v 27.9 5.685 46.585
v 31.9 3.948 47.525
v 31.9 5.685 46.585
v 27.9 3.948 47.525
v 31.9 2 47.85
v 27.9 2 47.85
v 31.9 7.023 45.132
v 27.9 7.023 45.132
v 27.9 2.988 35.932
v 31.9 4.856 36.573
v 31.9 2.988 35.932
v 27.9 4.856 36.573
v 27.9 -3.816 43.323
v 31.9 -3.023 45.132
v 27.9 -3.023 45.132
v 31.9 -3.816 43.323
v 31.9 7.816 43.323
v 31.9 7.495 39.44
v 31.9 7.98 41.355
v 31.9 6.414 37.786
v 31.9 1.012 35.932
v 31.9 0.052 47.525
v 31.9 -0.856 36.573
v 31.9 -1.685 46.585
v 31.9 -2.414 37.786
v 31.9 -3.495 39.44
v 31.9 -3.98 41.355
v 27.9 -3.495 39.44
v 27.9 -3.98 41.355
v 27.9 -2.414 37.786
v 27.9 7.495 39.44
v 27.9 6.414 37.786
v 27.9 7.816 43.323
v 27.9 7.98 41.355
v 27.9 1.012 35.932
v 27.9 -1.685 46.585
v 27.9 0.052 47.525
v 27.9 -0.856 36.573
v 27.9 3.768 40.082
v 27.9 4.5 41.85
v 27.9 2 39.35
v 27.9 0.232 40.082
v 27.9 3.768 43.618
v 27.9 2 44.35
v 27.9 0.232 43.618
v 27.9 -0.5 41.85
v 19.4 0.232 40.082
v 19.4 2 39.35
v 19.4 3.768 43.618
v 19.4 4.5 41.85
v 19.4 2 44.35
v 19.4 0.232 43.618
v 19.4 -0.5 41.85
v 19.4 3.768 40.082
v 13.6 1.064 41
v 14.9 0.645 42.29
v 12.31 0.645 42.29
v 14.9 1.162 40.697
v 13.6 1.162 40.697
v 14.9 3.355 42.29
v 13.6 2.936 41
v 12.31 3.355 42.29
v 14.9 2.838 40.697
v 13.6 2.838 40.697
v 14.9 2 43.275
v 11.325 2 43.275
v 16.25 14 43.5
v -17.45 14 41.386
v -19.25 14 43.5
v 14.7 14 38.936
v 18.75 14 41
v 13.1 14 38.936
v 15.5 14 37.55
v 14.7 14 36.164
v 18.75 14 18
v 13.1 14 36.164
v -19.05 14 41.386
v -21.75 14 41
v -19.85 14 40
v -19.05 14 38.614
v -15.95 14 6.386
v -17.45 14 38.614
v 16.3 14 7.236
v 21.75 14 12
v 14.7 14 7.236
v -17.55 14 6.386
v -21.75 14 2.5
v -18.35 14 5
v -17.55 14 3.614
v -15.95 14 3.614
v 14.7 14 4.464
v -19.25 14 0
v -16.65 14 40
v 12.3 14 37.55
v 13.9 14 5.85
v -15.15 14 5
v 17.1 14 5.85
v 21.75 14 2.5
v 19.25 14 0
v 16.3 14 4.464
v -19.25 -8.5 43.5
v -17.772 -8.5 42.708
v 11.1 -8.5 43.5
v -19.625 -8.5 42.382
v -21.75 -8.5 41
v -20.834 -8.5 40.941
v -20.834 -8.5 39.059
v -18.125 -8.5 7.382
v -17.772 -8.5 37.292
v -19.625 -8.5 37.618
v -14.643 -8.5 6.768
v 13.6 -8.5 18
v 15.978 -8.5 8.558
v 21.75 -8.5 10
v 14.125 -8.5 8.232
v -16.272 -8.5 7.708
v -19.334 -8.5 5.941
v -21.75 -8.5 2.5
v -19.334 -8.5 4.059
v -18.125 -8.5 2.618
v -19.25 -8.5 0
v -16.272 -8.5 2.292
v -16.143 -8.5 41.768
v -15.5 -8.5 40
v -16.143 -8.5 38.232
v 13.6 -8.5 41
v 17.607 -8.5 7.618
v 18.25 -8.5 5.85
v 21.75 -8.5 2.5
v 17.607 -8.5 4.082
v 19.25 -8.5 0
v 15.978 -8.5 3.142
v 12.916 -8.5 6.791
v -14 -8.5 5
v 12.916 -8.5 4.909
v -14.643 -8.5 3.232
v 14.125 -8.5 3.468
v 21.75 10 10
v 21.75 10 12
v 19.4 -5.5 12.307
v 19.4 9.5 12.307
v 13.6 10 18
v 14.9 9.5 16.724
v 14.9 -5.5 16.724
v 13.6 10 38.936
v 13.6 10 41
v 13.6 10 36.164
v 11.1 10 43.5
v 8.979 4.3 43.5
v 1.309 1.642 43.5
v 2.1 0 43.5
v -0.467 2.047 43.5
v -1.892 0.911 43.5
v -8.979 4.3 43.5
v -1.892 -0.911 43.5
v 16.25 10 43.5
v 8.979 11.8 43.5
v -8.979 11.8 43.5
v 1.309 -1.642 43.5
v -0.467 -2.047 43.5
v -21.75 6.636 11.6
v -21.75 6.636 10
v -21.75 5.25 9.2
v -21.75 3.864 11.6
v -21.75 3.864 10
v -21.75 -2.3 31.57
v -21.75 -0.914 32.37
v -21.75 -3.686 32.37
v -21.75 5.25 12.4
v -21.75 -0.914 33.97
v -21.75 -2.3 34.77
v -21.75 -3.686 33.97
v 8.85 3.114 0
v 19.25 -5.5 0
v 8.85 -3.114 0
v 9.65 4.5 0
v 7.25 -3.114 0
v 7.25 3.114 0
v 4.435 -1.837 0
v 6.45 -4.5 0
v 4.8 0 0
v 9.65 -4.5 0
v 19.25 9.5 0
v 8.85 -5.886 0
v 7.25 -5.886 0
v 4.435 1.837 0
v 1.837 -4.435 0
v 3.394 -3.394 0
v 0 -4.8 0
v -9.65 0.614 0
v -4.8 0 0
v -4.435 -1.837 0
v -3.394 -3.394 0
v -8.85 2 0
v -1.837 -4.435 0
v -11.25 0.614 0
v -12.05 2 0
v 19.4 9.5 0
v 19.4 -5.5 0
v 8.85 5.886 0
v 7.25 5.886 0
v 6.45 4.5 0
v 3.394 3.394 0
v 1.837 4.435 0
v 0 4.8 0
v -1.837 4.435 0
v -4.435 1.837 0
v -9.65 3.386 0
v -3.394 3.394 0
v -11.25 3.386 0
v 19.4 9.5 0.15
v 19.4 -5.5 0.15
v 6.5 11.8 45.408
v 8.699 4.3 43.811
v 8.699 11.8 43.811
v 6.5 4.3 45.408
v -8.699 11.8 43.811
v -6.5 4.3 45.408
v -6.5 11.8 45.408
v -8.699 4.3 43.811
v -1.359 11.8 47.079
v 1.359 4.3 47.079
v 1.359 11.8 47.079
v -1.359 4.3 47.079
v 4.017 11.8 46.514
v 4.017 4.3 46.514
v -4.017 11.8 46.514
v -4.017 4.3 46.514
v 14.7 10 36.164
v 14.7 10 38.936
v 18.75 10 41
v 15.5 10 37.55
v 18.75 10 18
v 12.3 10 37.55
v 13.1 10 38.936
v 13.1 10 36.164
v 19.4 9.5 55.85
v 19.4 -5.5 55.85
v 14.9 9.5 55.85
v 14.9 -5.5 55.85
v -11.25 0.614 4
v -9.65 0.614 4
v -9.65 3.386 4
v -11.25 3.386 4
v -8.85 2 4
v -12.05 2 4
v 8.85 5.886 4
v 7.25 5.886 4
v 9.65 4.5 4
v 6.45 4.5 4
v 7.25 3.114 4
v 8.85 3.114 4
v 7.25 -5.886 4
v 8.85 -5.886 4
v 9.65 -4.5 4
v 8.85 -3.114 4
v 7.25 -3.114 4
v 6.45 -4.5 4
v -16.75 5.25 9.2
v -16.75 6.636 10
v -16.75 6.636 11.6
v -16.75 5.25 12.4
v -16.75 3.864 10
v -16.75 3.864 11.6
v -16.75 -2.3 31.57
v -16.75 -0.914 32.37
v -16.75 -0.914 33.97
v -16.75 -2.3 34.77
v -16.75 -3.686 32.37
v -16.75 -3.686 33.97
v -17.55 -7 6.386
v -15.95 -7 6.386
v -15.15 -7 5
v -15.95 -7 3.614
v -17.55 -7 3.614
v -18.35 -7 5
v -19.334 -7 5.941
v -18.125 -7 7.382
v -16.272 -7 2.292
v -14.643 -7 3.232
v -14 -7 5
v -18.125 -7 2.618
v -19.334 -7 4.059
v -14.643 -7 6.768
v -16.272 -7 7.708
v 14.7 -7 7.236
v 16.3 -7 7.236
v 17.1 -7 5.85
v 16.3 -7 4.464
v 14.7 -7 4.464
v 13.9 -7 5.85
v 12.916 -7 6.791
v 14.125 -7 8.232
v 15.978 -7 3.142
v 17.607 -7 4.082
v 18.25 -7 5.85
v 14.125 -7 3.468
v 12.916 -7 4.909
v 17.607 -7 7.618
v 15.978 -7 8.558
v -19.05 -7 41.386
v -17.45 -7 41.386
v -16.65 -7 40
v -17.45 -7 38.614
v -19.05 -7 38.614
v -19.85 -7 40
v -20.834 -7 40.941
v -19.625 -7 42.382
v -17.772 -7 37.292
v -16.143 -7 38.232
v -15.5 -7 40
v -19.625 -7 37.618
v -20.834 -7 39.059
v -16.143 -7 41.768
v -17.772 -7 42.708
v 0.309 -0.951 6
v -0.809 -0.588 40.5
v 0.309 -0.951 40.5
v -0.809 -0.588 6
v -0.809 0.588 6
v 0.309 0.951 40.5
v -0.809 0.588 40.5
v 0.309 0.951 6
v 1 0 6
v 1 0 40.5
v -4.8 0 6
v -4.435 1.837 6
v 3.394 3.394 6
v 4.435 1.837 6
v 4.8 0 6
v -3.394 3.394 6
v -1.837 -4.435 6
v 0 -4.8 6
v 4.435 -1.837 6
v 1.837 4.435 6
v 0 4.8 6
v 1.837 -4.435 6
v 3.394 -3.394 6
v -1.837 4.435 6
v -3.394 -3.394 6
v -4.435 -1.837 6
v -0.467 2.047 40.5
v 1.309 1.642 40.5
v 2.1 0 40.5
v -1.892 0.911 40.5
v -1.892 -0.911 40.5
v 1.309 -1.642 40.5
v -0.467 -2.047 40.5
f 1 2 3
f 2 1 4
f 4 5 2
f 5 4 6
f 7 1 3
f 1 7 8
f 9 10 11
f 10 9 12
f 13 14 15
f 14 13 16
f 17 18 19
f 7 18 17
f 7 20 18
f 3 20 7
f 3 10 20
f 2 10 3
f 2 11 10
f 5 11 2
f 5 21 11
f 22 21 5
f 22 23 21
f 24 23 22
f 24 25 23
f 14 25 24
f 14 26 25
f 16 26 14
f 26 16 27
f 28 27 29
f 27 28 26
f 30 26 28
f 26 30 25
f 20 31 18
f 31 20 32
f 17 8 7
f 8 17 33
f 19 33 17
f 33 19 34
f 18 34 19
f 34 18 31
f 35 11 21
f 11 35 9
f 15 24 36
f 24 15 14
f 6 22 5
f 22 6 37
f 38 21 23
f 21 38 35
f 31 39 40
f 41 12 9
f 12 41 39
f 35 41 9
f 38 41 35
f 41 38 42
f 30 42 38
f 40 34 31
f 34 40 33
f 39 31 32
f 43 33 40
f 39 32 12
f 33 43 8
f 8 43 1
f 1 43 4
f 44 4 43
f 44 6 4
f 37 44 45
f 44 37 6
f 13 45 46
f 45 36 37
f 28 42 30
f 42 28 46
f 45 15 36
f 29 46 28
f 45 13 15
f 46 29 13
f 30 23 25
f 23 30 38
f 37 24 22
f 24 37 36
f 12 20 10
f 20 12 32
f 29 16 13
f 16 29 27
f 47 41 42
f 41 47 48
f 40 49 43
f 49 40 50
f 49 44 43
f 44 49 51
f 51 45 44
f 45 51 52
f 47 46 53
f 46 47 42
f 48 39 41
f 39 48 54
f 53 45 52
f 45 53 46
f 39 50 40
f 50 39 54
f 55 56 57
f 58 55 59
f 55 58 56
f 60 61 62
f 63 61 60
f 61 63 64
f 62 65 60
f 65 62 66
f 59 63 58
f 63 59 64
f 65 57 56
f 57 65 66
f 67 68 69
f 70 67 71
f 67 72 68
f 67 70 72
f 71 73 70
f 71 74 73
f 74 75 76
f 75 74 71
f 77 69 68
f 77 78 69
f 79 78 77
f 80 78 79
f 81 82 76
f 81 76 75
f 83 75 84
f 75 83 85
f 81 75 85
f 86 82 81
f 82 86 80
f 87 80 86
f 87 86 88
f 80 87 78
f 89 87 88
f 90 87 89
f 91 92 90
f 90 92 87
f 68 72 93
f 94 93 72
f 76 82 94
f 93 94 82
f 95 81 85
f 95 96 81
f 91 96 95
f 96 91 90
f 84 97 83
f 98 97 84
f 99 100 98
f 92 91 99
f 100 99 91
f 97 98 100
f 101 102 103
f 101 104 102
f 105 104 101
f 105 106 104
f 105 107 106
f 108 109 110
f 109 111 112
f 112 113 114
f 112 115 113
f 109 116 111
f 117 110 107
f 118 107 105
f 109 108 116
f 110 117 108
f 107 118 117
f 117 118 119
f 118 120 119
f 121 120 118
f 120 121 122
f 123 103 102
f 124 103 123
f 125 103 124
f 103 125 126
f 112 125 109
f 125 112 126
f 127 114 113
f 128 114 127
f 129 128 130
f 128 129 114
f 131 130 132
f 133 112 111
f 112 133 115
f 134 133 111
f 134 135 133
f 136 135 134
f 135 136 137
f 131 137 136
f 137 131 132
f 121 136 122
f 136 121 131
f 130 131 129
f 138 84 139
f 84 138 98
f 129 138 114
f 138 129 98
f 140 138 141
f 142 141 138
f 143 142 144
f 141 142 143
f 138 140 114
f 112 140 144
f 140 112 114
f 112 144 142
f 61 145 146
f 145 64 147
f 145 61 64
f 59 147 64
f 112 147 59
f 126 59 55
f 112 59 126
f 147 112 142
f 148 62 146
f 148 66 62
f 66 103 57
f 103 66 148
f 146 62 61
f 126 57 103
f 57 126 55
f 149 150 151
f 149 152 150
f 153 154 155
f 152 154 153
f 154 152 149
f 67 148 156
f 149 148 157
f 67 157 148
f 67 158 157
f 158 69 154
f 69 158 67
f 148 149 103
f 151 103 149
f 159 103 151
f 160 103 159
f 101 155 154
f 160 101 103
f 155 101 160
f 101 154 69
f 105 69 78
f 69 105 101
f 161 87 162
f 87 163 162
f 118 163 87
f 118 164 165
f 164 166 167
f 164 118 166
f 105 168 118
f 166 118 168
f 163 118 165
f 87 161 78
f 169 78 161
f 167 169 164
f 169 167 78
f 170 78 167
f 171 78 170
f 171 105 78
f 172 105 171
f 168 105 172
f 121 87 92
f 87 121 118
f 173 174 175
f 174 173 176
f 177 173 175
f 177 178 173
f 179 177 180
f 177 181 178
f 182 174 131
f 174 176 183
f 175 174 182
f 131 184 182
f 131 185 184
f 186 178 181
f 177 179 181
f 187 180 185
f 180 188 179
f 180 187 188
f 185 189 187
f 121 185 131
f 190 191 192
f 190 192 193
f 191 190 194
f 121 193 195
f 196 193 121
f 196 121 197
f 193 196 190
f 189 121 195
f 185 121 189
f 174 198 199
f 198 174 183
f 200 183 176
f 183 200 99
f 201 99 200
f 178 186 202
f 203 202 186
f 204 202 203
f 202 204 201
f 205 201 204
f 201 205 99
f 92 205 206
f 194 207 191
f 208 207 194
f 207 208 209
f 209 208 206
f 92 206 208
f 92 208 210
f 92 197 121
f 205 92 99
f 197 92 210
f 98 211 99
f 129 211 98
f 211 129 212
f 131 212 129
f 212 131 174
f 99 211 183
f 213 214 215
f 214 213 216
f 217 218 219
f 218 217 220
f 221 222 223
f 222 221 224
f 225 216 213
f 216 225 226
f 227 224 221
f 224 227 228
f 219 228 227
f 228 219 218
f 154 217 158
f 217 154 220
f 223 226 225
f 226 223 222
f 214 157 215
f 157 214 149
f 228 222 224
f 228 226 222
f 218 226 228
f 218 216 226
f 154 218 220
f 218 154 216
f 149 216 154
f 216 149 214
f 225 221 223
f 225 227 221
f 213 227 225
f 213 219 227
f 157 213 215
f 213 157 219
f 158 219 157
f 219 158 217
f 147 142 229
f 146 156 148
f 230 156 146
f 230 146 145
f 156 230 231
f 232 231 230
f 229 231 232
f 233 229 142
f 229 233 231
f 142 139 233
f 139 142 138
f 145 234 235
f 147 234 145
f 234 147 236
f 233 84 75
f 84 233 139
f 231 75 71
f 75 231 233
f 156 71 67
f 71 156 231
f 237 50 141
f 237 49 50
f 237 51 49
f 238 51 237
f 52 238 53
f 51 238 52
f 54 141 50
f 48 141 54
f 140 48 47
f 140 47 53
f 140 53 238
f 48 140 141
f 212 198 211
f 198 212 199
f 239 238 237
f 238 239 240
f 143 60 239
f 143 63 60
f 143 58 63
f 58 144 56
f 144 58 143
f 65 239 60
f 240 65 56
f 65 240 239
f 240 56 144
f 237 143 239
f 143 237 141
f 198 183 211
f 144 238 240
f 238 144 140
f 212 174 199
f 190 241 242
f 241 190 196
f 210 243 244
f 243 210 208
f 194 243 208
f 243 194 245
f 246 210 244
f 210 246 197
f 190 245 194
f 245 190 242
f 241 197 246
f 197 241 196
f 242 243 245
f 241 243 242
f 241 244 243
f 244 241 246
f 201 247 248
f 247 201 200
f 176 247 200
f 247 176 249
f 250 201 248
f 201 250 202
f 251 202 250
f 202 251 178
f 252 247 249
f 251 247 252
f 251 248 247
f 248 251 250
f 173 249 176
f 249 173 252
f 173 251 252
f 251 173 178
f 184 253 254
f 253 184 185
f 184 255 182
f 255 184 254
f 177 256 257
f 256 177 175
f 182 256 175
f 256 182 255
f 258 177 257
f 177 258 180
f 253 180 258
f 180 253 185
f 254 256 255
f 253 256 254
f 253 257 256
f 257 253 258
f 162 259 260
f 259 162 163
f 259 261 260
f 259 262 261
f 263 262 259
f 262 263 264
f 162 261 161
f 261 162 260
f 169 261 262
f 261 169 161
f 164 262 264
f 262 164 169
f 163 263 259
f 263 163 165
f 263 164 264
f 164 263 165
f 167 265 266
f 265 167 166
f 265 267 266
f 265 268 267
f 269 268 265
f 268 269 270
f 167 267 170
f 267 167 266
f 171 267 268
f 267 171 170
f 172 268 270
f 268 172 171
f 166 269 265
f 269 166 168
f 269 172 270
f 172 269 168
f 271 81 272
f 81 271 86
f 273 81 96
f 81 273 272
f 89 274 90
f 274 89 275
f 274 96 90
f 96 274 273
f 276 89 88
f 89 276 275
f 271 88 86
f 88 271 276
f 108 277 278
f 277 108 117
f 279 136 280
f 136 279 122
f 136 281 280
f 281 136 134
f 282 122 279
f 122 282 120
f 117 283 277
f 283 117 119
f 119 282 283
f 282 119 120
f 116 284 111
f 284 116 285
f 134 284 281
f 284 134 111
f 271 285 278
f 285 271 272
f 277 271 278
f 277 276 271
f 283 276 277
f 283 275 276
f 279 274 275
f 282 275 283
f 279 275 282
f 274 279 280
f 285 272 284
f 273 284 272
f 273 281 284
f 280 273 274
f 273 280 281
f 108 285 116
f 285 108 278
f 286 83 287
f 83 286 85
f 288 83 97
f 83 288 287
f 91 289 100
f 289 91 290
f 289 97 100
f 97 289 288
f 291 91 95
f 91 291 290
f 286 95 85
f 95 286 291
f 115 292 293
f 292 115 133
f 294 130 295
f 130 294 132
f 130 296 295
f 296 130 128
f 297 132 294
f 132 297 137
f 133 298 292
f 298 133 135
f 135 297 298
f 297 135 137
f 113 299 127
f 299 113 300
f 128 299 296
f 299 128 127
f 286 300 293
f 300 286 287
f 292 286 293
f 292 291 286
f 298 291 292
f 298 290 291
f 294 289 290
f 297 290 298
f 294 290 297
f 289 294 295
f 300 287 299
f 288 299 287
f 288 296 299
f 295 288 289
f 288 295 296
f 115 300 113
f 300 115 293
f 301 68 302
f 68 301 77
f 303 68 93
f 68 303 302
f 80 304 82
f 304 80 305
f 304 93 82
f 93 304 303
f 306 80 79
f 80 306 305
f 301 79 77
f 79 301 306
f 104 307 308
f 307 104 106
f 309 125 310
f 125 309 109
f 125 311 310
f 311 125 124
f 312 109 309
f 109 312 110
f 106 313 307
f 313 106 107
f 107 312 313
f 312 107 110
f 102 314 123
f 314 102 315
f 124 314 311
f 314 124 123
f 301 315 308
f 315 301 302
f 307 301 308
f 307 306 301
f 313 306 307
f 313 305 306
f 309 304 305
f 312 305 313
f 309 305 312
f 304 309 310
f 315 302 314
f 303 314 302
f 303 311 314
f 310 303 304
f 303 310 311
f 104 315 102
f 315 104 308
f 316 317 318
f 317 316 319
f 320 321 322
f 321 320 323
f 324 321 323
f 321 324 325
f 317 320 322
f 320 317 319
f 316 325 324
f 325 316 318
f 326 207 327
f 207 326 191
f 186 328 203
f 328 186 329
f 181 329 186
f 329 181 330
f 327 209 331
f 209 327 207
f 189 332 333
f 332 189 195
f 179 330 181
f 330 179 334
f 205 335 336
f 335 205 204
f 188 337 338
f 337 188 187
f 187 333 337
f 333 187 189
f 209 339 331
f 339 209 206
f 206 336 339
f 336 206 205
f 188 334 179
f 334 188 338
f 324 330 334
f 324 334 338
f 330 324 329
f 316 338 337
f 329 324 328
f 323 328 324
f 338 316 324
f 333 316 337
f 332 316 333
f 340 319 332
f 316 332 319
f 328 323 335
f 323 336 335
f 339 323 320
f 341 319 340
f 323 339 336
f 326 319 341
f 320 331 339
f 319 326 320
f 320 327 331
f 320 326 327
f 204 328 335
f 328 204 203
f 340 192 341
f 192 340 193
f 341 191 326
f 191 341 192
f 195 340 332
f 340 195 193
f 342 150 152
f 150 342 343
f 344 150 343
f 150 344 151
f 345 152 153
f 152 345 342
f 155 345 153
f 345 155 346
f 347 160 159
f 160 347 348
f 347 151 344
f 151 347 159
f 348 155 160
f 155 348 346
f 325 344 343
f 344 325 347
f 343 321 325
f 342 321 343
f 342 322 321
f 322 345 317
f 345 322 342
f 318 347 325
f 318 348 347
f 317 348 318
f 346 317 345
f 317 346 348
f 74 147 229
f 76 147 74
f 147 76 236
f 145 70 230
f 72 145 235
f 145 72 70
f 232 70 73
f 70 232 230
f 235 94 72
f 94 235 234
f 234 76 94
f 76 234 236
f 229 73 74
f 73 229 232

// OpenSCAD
/*
  TBG-Lite extruder OpenSCAD library
  
  Based on datasheet and measures of TBG-Lite_mockup.STEP
  (C) 2022 Marek Wodzinski <majek@w7i.pl>
  
  This library is licensed under a Creative Commons Attribution-ShareAlike 4.0 International License.
  You should have received a copy of the license along with this work.
  If not, see <http://creativecommons.org/licenses/by-sa/4.0/
  
  Some basic dimensions:
  - holes for screws: 3.2mm, head 5.5mm
  - corners: 2.5mm from edge
  - distance from front to motor plate: 21mm
  - motor center: [19.9,21.1]
  - base dimensions: 43.50mm x 22.5mm
  - filement hole from front: 8.5mm
  - back plate thickness: 4mm
*/

function TBG_w() = 43.50;
function TBG_dimensions() = [ -TBG_w()/2, // left from center
                              TBG_w()/2, // right from center
                              -8.5, // front
                              14.0 ]; // back
function TBG_holes_bottom() = [[-10.45,2,0], [8.05,4.50,0], [8.05,-4.50,0]];
function TBG_holes_left() = [[-TBG_w()/2,5.25,TBG_w()/2-10.95], [-TBG_w()/2,-2.30,TBG_w()/2+11.42]];
function TBG_holes_front() = [[-TBG_w()/2+5.00,-8.50,5.00], [15.50,-8.50,5.85], [-TBG_w()/2+3.50,-8.50,TBG_w()-3.50]];
function TBG_body() = [[-TBG_w()/2+2.5,0], [TBG_w()/2-2.5,0], [TBG_w()/2,2.5], [TBG_w()/2,10], [TBG_w()/2-8.15,18], [TBG_w()/2-8.15,TBG_w()-2.5], [TBG_w()/2-8.15-2.5,TBG_w()], [-TBG_w()/2+2.5,TBG_w()], [-TBG_w()/2,TBG_w()-2.5], [-TBG_w()/2,2.5]];
function TBG_backplate() = [[-TBG_w()/2+2.5,0], [TBG_w()/2-2.5,0], [TBG_w()/2,2.5], [TBG_w()/2,12], [TBG_w()/2-3,18], [TBG_w()/2-3,TBG_w()-2.5], [TBG_w()/2-3-2.5,TBG_w()], [-TBG_w()/2+2.5,TBG_w()], [-TBG_w()/2,TBG_w()-2.5], [-TBG_w()/2,2.5]];
function TBG_motor_position() = [[-TBG_w()/2+19.9,13,21.1],[90,-47,0]];

module TBG_lite(){
  difference(){
    union(){
      // body
      color("#404040") rotate([90,0,0]) translate([0,0,-22.50+8.50]) linear_extrude(22.50) polygon(TBG_body());
      // gear shroud
      color("#404040") translate([0,22.5-8.50-2.20,34.15]) rotate([90,0,0]) cylinder(d=26,h=7.5);
      // back plate
      color("#404040") rotate([90,0,0]) translate([0,0,-22.50+8.50]) linear_extrude(4) polygon(TBG_backplate());
      // lever
      color("#404040") translate([-TBG_w()/2+36.65,-8.5+3,0]) cube([4.50,15,55.85]);
      // screw
      translate([53.65-TBG_w()/2,-8.5+3+15/2,39.85+2]) rotate([0,-90,0]) {
        color("#404040") cylinder(h=4,d=12); // dial
        color("#808080") cylinder(h=16,d=5); // spring
        color("#a0a0a0") cylinder(h=25,d=2.85); // screw
      }
    }

    // HOLES

    // filament hole
    cylinder(h=TBG_w(),d=2); // main hole
    cylinder(h=6,d=9.6); // M10 hole
    translate([0,0,TBG_w()-3]) cylinder(h=3,d=4.2); // PTFE hole
    // bottom mount holes
    for ( i=[0:2]) {
      translate(TBG_holes_bottom()[i]) cylinder(h=4,d=3.2);
    }
    // left mount holes
    for ( i=[0:1]) {
      translate(TBG_holes_left()[i]) rotate([0,90,0]) cylinder(h=5,d=3.2);
    }
    // front mount holes
    for ( i=[0:2]) {
      translate(TBG_holes_front()[i]) rotate([-90,0,0]) {
        cylinder(h=23,d=3.2);
        cylinder(h=1.5,d=5.5);
      }
    }
    // rear motor hole
    translate([13.9,22.5-8.5,37.55]) rotate([90,0,0]) cylinder(h=4,d=3.2);
  }
}

TBG_lite();
